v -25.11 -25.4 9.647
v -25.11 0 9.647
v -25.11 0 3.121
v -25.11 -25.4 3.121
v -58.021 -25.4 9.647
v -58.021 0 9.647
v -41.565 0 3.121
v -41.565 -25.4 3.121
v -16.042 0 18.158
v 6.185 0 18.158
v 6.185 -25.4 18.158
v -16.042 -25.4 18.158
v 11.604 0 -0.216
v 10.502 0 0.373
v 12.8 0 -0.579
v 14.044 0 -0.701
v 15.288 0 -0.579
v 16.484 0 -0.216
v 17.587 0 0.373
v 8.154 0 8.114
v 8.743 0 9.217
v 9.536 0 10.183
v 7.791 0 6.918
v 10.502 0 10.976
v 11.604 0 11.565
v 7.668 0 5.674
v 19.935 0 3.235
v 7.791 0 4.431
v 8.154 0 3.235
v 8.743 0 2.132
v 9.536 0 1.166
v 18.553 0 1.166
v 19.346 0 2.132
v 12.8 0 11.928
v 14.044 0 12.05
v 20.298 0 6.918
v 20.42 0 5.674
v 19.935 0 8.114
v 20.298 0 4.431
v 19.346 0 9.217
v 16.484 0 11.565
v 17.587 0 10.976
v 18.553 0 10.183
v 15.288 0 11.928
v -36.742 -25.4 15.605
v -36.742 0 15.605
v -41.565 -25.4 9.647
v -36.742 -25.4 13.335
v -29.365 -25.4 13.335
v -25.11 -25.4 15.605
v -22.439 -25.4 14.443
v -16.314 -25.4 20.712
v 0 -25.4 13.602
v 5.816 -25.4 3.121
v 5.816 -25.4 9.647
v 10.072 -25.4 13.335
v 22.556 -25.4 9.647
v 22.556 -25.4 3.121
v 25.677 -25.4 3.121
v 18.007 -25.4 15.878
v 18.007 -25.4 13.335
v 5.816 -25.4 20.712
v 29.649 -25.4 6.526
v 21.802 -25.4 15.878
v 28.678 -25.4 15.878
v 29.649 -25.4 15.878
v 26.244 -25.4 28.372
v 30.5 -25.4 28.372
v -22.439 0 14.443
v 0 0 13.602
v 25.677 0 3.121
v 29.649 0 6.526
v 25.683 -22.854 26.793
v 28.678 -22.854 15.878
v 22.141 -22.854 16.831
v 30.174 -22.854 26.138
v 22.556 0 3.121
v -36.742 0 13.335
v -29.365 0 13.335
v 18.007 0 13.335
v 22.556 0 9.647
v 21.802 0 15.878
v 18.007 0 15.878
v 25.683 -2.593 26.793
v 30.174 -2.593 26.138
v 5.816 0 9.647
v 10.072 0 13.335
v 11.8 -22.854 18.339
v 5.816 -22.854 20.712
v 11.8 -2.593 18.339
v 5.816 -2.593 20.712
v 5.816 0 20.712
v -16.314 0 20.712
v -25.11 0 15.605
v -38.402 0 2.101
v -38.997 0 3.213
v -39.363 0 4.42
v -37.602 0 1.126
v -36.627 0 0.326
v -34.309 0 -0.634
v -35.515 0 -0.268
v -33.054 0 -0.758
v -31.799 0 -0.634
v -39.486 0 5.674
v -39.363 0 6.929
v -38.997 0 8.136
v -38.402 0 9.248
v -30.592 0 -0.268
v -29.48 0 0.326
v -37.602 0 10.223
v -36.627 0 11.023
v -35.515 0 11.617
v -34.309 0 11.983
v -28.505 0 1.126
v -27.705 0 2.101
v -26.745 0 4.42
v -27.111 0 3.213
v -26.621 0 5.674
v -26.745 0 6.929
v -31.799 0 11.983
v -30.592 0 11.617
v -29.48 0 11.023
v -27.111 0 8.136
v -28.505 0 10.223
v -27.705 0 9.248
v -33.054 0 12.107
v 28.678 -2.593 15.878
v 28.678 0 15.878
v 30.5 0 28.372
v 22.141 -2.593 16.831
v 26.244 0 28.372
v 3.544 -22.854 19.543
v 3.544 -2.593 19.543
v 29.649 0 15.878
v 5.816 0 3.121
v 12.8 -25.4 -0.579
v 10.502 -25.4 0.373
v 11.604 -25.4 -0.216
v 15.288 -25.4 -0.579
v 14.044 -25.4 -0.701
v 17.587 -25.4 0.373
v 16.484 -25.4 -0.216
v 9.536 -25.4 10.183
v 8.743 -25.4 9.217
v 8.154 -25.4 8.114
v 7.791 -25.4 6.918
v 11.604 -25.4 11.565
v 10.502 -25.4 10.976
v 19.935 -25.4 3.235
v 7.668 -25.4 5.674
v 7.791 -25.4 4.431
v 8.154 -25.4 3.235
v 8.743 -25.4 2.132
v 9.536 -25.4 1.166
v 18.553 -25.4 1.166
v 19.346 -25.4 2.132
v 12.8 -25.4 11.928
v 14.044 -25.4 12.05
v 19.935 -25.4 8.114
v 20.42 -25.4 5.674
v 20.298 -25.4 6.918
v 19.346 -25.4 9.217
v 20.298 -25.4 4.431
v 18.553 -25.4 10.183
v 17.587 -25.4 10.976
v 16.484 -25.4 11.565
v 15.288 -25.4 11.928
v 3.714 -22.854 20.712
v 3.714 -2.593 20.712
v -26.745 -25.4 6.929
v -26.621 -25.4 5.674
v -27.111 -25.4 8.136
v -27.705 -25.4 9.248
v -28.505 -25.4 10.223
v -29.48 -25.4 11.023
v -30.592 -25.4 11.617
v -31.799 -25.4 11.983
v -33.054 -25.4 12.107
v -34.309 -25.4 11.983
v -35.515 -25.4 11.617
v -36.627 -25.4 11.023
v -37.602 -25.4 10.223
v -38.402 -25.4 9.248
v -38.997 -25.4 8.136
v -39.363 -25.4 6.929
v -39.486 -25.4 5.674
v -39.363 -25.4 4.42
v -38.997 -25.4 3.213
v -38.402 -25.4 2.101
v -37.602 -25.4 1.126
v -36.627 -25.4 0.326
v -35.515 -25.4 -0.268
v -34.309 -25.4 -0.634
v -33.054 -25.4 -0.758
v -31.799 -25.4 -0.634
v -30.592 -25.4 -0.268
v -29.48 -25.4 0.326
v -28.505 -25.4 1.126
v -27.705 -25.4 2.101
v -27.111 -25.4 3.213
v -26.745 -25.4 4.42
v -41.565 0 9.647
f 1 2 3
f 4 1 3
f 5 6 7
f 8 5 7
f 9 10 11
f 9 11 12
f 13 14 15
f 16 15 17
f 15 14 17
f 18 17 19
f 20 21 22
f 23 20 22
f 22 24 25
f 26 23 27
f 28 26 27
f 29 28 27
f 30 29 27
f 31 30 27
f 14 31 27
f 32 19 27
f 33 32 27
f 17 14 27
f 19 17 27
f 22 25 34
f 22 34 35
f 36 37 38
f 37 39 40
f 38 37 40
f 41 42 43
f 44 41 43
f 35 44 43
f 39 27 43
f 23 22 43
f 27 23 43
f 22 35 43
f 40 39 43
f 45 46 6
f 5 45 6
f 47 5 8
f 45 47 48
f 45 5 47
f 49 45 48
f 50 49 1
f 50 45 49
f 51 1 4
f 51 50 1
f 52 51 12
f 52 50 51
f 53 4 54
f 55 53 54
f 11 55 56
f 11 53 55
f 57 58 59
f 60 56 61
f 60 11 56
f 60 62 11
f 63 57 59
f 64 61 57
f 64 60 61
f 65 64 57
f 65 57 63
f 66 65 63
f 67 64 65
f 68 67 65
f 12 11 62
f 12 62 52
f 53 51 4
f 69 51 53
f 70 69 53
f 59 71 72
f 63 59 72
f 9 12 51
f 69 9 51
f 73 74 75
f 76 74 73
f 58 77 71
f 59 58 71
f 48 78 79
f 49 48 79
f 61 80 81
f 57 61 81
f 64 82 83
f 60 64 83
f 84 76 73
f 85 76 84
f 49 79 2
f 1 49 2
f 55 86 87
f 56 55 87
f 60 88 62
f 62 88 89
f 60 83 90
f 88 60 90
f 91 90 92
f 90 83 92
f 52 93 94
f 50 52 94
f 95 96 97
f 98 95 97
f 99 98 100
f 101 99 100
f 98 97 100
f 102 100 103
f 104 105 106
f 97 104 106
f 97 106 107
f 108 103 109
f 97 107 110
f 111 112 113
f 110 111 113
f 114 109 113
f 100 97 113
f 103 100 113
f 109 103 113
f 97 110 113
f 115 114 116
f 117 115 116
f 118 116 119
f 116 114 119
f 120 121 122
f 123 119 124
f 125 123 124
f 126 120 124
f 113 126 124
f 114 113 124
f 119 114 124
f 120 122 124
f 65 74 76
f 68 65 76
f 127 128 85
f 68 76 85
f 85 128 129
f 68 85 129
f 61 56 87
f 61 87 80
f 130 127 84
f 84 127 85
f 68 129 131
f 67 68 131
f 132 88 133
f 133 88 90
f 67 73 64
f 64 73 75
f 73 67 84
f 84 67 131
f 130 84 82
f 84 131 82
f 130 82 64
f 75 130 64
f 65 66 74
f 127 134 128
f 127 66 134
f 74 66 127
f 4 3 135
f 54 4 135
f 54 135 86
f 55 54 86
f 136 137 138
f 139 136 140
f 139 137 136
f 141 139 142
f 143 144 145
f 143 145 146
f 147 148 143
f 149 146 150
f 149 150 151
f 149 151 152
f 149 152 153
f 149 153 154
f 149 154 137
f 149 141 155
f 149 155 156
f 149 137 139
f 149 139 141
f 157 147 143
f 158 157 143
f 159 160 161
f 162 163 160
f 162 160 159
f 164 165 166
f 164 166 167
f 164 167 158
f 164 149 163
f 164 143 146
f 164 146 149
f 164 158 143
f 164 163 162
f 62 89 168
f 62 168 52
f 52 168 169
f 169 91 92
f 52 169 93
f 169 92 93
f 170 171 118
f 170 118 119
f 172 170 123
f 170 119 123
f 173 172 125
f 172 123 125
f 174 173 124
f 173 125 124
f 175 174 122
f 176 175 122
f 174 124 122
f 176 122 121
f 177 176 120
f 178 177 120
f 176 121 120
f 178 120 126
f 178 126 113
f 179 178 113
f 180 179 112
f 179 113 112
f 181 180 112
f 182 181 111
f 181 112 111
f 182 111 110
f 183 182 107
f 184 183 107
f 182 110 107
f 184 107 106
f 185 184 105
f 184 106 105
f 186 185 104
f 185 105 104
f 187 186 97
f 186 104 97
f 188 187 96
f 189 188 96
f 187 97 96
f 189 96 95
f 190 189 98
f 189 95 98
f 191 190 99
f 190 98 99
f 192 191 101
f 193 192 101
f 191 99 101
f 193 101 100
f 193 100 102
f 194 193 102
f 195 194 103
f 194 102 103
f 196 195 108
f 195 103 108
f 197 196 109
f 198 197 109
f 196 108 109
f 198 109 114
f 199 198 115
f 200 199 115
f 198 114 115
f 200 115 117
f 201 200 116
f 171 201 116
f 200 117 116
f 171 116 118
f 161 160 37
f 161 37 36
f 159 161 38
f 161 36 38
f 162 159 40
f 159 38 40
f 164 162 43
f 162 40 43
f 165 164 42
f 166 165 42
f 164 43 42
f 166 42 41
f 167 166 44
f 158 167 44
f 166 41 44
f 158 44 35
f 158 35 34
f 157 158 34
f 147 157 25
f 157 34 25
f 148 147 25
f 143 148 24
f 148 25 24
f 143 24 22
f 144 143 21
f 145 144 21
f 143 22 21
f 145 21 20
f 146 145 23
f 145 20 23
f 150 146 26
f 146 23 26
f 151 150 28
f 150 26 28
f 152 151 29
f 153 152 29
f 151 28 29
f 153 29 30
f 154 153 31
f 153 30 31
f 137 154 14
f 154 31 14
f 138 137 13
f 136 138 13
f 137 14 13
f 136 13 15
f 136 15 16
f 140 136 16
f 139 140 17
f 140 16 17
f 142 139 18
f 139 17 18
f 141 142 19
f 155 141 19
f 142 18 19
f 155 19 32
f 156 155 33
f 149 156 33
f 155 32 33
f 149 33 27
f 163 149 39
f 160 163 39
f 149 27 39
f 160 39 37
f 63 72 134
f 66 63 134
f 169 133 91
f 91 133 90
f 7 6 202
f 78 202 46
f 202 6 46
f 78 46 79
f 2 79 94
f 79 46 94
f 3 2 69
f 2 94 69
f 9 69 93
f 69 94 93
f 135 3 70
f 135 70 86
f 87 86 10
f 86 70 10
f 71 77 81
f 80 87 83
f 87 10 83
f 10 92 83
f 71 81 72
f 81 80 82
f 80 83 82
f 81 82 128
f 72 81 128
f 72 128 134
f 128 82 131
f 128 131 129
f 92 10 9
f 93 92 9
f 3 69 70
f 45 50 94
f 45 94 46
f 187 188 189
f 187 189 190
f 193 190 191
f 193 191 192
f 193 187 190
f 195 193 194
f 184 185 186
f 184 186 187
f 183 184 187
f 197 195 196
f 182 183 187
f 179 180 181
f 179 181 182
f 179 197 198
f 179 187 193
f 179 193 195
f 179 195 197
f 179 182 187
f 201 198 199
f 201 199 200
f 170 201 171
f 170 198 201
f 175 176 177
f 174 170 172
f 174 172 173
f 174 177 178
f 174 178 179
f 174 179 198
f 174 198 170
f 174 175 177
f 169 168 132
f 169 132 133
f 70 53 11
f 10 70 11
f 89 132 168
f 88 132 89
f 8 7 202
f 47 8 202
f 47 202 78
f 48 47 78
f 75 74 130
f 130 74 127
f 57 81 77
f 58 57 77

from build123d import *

# Parameters (mm, degrees)
F0_R      = 6.4324551625
F1_DEPTH  = 25.4
F0_R_2    = 6.3758906755
F3_DEPTH  = 25.4
F5_DEPTH  = 25.4
F7_DEPTH  = 22.86
F8_W      = 20.260772435
F8_H      = 10.3689224105
F9_DEPTH  = 25.4
F11_DEPTH = 25.4


with BuildPart() as f1:
    # F0 (on Front) → F1 (new body)
    with BuildSketch(Plane.XZ):
        with Locations((-33.0537781119, 5.6744683534)):
            Circle(F0_R)
    extrude(amount=F1_DEPTH)

    # F6 (on Front) → F7 (cut)
    with BuildSketch(Plane.XZ):
        Polygon((-14.8954782635, 17.8745742887), (-19.4350536913, 14.7536173463), (5.2488842048, 14.7536173463), (5.2488842048, 17.8745742887), align=None)
    extrude(amount=-F7_DEPTH, mode=Mode.SUBTRACT)


with BuildPart() as f1b:
    # F0 (on Front) → F1, piece 2 (new body)
    with BuildSketch(Plane.XZ):
        with Locations((14.0443081036, 5.6744683534)):
            Circle(F0_R_2)
    extrude(amount=F1_DEPTH)


with BuildPart() as f3:
    # F2 (on Front) → F3 (new body)
    with BuildSketch(Plane.XZ):
        Polygon((-25.1095220447, 9.6465954557), (-25.1095220447, 3.1209576409), (5.8163302019, 3.1209576409), (5.8163302019, 9.6465954557), (10.0721819326, 13.3350007236), (18.0071789661, 13.3350007236), (22.5560087711, 9.6465954557), (22.5560087711, 3.1209576409), (25.6769694388, 3.1209576409), (29.6490956098, 6.5256385133), (29.6490956098, 15.8775064075), (18.0071789661, 15.8775064075), (5.8163302019, 20.7118075341), (-16.3140948862, 20.7118075341), (-25.1095220447, 15.6047875062), (-36.7421805859, 15.6047875062), (-58.0214373767, 9.6465954557), (-41.5654778481, 3.1209576409), (-41.5654778481, 9.6465954557), (-36.7421805859, 13.3350007236), (-29.3653719127, 13.3350007236), align=None)
    extrude(amount=F3_DEPTH)

    # F4 (on Front) → F5 (join)
    with BuildSketch(Plane.XZ):
        Polygon((21.7048414052, 15.6047875062), (28.5142026842, 14.7536173463), (30.5002648383, 28.372341767), (26.2444131076, 28.372341767), align=None)
    extrude(amount=F5_DEPTH)

    # F8 (on face) → F9 (cut)
    with BuildSketch(Plane(origin=(25.8136482921, 0, -3.7644869189), x_dir=(0, 1, 0), z_dir=(0.989533, 0, -0.1443067633))):
        with Locations((-12.7233496169, 25.0342219779)):
            Rectangle(F8_W, F8_H)
    extrude(amount=-F9_DEPTH, mode=Mode.SUBTRACT)

    # F10 (on face) → F11 (cut)
    with BuildSketch(Plane.XZ.offset(25.4)):
        Polygon((-16.0416022874, 18.1582975201), (-22.4394258112, 14.4434338436), (0, 13.6015424505), (6.1849080957, 18.1582975201), align=None)
    extrude(amount=-F11_DEPTH, mode=Mode.SUBTRACT)


solid = Compound([f1.part, f1b.part, f3.part])
